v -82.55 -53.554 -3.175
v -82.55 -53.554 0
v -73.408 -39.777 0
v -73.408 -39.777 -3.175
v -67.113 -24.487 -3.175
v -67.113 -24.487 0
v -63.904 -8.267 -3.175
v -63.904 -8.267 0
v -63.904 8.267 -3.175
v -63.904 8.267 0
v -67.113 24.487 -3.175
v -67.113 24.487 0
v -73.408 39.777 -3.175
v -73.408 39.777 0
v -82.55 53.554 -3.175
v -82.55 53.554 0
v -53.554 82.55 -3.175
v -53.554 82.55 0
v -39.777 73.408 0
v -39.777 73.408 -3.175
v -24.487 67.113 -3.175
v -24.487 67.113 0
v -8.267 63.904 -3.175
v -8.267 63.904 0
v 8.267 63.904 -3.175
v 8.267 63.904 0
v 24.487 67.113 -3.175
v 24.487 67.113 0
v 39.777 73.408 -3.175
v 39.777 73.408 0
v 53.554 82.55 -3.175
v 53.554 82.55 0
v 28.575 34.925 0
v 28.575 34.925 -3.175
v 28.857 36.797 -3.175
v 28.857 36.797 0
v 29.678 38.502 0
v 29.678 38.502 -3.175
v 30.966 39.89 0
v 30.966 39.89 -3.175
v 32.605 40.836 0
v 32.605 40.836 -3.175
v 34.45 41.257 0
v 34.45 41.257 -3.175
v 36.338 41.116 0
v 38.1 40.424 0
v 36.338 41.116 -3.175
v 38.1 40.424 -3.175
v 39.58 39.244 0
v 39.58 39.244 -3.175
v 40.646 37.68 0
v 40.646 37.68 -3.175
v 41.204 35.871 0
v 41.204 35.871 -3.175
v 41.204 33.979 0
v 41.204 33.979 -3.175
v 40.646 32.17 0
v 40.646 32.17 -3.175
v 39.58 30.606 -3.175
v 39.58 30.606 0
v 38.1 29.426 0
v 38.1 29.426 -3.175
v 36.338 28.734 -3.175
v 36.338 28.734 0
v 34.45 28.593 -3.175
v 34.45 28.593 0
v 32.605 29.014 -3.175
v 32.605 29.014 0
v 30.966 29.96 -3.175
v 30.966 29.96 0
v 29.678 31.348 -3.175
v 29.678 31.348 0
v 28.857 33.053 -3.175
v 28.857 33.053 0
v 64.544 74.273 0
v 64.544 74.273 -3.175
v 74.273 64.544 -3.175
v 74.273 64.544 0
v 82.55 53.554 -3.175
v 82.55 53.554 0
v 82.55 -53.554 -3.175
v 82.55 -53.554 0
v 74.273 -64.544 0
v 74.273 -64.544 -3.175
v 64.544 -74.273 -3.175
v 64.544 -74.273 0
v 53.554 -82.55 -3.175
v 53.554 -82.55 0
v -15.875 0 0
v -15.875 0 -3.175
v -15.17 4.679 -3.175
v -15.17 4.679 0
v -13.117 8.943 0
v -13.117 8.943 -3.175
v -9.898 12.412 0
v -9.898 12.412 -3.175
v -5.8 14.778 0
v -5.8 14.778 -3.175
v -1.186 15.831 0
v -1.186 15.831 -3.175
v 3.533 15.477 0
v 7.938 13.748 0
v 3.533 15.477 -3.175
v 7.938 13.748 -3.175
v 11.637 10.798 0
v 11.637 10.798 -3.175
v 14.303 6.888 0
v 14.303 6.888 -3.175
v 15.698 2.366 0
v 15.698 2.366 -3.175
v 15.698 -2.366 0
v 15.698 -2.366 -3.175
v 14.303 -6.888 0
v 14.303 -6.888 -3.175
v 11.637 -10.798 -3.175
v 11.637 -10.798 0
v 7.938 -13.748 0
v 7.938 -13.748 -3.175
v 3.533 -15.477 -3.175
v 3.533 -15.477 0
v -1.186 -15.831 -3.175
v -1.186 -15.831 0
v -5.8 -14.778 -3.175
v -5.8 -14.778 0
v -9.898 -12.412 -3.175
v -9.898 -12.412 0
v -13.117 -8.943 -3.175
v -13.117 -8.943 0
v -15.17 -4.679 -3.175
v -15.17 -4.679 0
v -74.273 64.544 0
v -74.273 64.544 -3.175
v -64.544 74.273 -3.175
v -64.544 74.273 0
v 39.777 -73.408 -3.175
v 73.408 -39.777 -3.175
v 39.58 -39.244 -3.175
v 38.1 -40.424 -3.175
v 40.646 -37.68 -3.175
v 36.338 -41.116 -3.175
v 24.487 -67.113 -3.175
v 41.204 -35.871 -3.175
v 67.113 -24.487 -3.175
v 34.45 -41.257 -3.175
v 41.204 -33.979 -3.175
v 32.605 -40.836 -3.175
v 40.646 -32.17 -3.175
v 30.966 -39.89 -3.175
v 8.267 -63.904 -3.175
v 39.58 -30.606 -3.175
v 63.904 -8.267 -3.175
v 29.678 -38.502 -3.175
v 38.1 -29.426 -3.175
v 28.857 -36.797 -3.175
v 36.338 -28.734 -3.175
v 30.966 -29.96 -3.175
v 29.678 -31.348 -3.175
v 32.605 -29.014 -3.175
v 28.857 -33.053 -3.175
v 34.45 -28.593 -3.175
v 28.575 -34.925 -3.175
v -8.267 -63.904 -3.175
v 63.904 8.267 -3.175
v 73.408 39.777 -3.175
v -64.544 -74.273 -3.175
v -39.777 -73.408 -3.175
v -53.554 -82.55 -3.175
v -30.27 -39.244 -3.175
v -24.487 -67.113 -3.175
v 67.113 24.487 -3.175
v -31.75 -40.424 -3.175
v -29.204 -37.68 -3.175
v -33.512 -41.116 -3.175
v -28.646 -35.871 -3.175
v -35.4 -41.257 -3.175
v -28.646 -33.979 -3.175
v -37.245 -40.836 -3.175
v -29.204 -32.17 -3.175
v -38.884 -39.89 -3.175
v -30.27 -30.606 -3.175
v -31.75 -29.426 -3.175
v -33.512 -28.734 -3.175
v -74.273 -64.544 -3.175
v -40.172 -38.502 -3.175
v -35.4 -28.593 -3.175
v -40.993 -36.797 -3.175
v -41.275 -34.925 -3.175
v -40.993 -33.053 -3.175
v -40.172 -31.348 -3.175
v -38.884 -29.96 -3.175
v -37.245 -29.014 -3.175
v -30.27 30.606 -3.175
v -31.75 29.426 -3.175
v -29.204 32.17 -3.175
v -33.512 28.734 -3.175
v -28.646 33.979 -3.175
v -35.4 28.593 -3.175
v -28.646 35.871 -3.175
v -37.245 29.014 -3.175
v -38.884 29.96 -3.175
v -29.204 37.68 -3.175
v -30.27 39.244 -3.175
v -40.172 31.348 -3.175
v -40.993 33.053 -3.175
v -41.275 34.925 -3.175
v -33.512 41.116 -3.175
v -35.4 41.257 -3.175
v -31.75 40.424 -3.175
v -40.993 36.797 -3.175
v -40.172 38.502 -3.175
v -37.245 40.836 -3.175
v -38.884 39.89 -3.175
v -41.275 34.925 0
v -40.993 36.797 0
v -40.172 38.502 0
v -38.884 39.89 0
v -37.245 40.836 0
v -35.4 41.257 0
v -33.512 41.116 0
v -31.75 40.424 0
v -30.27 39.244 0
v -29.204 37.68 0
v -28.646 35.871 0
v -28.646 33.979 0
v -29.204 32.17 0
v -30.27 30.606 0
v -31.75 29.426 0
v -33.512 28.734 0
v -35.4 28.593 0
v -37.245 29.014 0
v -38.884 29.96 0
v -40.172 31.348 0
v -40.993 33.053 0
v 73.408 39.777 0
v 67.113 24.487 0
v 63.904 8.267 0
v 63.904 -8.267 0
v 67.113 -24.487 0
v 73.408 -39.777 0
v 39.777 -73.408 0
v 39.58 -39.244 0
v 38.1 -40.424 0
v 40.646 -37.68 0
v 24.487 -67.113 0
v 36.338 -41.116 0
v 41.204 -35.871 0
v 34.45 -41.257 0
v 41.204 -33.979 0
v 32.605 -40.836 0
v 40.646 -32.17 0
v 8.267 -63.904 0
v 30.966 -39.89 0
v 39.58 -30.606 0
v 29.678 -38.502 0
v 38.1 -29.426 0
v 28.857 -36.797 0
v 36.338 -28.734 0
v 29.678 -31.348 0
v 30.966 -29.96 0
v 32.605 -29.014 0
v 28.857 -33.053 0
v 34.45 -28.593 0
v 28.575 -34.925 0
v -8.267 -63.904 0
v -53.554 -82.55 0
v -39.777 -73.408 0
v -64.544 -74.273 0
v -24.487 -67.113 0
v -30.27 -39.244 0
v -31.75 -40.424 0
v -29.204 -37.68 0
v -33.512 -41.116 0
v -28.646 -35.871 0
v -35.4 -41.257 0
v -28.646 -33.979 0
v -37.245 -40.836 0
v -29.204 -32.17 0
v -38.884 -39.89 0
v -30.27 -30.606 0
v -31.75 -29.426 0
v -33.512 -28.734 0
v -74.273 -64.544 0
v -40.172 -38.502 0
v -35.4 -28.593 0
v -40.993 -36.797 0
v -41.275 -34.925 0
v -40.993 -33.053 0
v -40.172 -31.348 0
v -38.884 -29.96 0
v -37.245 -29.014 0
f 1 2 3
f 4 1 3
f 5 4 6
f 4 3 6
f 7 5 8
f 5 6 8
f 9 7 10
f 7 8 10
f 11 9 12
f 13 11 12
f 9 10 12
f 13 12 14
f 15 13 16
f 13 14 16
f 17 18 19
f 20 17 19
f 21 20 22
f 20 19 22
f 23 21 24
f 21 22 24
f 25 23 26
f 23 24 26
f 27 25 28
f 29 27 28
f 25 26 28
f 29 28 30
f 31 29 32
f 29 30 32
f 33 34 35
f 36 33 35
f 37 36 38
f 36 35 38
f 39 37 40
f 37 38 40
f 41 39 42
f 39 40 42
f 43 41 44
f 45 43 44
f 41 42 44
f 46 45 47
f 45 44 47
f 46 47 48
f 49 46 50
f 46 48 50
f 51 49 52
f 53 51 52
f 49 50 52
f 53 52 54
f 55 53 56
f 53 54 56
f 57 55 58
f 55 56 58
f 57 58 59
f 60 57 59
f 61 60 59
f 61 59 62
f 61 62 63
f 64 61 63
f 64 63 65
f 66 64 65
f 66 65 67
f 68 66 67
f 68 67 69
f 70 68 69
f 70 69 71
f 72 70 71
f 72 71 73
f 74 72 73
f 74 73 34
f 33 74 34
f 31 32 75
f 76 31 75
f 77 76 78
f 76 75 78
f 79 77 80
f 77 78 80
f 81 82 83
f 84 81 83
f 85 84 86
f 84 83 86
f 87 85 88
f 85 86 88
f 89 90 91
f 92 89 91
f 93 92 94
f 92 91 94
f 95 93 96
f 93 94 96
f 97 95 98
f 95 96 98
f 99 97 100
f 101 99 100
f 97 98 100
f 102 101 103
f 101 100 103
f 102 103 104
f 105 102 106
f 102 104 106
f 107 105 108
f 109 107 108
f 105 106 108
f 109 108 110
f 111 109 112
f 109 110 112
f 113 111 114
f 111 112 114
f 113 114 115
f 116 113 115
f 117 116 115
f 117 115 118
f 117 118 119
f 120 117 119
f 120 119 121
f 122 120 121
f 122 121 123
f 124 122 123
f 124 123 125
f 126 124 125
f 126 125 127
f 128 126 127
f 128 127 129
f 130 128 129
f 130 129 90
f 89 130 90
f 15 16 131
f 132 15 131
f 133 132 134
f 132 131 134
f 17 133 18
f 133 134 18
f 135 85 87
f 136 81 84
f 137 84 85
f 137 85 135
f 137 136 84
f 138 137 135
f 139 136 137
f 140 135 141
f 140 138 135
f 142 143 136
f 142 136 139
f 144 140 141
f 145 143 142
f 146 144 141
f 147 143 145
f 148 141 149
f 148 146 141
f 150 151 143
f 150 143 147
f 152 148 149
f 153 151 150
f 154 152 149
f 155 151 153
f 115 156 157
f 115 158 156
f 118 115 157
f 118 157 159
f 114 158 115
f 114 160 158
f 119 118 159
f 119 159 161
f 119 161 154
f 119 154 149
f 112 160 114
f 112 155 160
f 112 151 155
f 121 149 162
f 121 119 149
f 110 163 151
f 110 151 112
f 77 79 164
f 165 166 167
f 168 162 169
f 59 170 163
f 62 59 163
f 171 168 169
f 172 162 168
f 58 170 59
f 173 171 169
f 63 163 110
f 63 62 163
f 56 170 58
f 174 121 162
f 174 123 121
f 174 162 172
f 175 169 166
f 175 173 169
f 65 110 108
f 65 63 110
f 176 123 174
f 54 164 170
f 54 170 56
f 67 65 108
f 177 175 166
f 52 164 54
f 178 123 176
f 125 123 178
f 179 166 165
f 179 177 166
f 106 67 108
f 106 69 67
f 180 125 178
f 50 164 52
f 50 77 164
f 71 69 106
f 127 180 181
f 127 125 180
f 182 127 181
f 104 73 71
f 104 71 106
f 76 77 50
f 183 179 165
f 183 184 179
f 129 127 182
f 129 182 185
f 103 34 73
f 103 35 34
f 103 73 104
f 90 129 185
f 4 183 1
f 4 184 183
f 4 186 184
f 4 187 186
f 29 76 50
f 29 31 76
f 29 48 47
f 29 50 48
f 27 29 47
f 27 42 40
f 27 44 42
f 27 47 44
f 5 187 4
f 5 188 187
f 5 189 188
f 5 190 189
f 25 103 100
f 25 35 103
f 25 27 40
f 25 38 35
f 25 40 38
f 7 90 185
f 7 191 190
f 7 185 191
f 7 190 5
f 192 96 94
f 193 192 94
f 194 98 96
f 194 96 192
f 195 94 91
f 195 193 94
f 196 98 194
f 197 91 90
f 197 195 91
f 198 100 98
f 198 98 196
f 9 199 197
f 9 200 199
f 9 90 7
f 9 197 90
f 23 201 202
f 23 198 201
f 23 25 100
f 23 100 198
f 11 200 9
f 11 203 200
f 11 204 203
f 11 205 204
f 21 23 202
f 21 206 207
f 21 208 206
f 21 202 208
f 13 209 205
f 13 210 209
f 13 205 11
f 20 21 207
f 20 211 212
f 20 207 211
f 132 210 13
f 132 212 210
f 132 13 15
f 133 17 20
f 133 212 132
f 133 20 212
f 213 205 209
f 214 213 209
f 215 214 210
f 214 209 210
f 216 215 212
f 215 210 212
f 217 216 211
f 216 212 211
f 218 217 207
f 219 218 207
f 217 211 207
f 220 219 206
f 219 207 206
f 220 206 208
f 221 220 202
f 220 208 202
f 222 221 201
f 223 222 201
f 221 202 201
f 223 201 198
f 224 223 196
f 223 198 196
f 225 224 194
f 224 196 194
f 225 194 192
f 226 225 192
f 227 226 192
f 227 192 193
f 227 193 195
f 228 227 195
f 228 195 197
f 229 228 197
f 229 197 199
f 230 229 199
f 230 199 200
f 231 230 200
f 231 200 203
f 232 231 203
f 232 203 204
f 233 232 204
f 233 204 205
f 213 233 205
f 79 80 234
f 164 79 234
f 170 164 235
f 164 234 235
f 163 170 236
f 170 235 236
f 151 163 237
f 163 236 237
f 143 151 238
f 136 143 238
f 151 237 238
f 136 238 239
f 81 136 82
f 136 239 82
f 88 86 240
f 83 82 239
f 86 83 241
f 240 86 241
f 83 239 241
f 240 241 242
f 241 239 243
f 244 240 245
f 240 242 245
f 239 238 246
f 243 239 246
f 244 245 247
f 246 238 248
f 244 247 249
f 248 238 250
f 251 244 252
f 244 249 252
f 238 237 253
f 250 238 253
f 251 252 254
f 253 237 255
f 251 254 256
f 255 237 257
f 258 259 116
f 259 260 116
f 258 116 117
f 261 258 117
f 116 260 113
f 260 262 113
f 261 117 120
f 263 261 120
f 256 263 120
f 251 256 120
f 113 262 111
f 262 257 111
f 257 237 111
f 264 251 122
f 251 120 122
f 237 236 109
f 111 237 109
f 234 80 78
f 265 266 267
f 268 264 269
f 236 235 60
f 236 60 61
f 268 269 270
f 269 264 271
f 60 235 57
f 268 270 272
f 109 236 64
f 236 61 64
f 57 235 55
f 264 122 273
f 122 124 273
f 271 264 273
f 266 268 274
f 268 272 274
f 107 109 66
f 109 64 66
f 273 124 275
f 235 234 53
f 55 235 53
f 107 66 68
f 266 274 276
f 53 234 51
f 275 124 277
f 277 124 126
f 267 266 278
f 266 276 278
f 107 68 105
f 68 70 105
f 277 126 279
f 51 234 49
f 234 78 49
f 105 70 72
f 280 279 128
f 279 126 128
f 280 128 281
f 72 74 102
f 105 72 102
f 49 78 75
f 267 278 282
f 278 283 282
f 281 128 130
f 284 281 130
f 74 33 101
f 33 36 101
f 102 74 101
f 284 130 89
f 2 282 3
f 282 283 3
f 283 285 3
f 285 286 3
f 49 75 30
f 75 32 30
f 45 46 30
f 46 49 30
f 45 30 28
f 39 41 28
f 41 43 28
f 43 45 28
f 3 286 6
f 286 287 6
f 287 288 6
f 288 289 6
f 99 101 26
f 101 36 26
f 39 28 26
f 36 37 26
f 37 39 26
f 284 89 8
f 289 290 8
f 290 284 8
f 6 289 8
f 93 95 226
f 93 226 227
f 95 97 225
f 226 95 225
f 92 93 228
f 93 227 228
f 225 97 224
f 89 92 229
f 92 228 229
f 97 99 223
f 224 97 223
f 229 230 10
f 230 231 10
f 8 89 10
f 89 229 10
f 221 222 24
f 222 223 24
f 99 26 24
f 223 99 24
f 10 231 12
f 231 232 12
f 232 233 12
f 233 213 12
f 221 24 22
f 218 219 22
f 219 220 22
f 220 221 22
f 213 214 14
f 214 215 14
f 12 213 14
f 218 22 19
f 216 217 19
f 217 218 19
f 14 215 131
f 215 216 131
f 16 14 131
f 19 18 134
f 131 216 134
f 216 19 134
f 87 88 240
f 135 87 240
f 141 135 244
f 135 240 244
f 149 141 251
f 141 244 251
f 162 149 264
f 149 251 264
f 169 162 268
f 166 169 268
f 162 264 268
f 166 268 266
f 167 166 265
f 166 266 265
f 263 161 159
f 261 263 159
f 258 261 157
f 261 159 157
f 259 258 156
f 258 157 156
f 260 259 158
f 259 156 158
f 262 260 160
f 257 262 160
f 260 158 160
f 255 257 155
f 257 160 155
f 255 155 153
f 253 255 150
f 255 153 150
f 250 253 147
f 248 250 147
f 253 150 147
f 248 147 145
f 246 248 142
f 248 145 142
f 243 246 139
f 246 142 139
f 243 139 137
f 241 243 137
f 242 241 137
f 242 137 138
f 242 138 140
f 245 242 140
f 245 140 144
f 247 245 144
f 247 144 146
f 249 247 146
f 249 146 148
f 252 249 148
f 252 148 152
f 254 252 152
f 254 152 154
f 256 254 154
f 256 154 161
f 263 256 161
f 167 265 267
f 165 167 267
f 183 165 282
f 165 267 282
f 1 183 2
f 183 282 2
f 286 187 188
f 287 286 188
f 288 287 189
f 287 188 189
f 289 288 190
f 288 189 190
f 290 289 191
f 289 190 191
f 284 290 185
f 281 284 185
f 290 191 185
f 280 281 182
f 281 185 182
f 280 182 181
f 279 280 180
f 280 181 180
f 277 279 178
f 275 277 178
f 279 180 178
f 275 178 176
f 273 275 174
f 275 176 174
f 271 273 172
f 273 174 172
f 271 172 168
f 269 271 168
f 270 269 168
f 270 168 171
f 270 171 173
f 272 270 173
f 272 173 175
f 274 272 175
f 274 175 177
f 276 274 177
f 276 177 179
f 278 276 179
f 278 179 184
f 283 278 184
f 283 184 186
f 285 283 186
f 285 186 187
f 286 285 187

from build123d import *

# Parameters (mm, degrees)
EXTRUDE1_DEPTH     = 3.175
CUT_EXTRUDE1_REACH = 5.175
SKETCH2_R          = 6.35
SKETCH2_R_2        = 15.875


with BuildPart() as part:
    # Sketch1 → Extrude1 (new body)
    with BuildSketch(Plane.XY):
        with BuildLine():
            ThreePointArc((-53.553513238, 82.55), (0, 63.5), (53.553513238, 82.55))
            ThreePointArc((53.553513238, 82.55), (69.579024426, 69.579024426), (82.55, 53.553513238))
            ThreePointArc((82.55, 53.553513238), (63.5, 0), (82.55, -53.553513238))
            ThreePointArc((82.55, -53.553513238), (69.579024426, -69.579024426), (53.553513238, -82.55))
            ThreePointArc((53.553513238, -82.55), (0, -63.5), (-53.553513238, -82.55))
            ThreePointArc((-53.553513238, -82.55), (-69.579024426, -69.579024426), (-82.55, -53.553513238))
            ThreePointArc((-82.55, -53.553513238), (-63.5, 0), (-82.55, 53.553513238))
            ThreePointArc((-82.55, 53.553513238), (-69.579024426, 69.579024426), (-53.553513238, 82.55))
        make_face()
    extrude(amount=-EXTRUDE1_DEPTH)

    # Sketch2 → Cut-Extrude1 (cut, up to next)
    with BuildSketch(Plane(origin=(0, 0, -3.175), x_dir=(-1, 0, 0), z_dir=(0, 0, -1)), mode=Mode.PRIVATE) as cut_extrude1_sk1:
        with Locations((-34.925, 34.925)):
            Circle(SKETCH2_R)
    cut_extrude1_tool1 = extrude(cut_extrude1_sk1.sketch, amount=-CUT_EXTRUDE1_REACH, mode=Mode.PRIVATE) & part.part
    add(cut_extrude1_tool1.solids().sort_by_distance((34.925, 34.925, -3.175))[0], mode=Mode.SUBTRACT)
    # Sketch2 → Cut-Extrude1 (cut, up to next)
    with BuildSketch(Plane(origin=(0, 0, -3.175), x_dir=(-1, 0, 0), z_dir=(0, 0, -1)), mode=Mode.PRIVATE) as cut_extrude1_sk2:
        with Locations((34.925, 34.925)):
            Circle(SKETCH2_R)
    cut_extrude1_tool2 = extrude(cut_extrude1_sk2.sketch, amount=-CUT_EXTRUDE1_REACH, mode=Mode.PRIVATE) & part.part
    add(cut_extrude1_tool2.solids().sort_by_distance((-34.925, 34.925, -3.175))[0], mode=Mode.SUBTRACT)
    # Sketch2 → Cut-Extrude1 (cut, up to next)
    with BuildSketch(Plane(origin=(0, 0, -3.175), x_dir=(-1, 0, 0), z_dir=(0, 0, -1)), mode=Mode.PRIVATE) as cut_extrude1_sk3:
        with Locations((34.925, -34.925)):
            Circle(SKETCH2_R)
    cut_extrude1_tool3 = extrude(cut_extrude1_sk3.sketch, amount=-CUT_EXTRUDE1_REACH, mode=Mode.PRIVATE) & part.part
    add(cut_extrude1_tool3.solids().sort_by_distance((-34.925, -34.925, -3.175))[0], mode=Mode.SUBTRACT)
    # Sketch2 → Cut-Extrude1 (cut, up to next)
    with BuildSketch(Plane(origin=(0, 0, -3.175), x_dir=(-1, 0, 0), z_dir=(0, 0, -1)), mode=Mode.PRIVATE) as cut_extrude1_sk4:
        with Locations((-34.925, -34.925)):
            Circle(SKETCH2_R)
    cut_extrude1_tool4 = extrude(cut_extrude1_sk4.sketch, amount=-CUT_EXTRUDE1_REACH, mode=Mode.PRIVATE) & part.part
    add(cut_extrude1_tool4.solids().sort_by_distance((34.925, -34.925, -3.175))[0], mode=Mode.SUBTRACT)
    # Sketch2 → Cut-Extrude1 (cut, up to next)
    with BuildSketch(Plane(origin=(0, 0, -3.175), x_dir=(-1, 0, 0), z_dir=(0, 0, -1)), mode=Mode.PRIVATE) as cut_extrude1_sk5:
        Circle(SKETCH2_R_2)
    cut_extrude1_tool5 = extrude(cut_extrude1_sk5.sketch, amount=-CUT_EXTRUDE1_REACH, mode=Mode.PRIVATE) & part.part
    add(cut_extrude1_tool5.solids().sort_by_distance((0, 0, -3.175))[0], mode=Mode.SUBTRACT)


solid = part.part
